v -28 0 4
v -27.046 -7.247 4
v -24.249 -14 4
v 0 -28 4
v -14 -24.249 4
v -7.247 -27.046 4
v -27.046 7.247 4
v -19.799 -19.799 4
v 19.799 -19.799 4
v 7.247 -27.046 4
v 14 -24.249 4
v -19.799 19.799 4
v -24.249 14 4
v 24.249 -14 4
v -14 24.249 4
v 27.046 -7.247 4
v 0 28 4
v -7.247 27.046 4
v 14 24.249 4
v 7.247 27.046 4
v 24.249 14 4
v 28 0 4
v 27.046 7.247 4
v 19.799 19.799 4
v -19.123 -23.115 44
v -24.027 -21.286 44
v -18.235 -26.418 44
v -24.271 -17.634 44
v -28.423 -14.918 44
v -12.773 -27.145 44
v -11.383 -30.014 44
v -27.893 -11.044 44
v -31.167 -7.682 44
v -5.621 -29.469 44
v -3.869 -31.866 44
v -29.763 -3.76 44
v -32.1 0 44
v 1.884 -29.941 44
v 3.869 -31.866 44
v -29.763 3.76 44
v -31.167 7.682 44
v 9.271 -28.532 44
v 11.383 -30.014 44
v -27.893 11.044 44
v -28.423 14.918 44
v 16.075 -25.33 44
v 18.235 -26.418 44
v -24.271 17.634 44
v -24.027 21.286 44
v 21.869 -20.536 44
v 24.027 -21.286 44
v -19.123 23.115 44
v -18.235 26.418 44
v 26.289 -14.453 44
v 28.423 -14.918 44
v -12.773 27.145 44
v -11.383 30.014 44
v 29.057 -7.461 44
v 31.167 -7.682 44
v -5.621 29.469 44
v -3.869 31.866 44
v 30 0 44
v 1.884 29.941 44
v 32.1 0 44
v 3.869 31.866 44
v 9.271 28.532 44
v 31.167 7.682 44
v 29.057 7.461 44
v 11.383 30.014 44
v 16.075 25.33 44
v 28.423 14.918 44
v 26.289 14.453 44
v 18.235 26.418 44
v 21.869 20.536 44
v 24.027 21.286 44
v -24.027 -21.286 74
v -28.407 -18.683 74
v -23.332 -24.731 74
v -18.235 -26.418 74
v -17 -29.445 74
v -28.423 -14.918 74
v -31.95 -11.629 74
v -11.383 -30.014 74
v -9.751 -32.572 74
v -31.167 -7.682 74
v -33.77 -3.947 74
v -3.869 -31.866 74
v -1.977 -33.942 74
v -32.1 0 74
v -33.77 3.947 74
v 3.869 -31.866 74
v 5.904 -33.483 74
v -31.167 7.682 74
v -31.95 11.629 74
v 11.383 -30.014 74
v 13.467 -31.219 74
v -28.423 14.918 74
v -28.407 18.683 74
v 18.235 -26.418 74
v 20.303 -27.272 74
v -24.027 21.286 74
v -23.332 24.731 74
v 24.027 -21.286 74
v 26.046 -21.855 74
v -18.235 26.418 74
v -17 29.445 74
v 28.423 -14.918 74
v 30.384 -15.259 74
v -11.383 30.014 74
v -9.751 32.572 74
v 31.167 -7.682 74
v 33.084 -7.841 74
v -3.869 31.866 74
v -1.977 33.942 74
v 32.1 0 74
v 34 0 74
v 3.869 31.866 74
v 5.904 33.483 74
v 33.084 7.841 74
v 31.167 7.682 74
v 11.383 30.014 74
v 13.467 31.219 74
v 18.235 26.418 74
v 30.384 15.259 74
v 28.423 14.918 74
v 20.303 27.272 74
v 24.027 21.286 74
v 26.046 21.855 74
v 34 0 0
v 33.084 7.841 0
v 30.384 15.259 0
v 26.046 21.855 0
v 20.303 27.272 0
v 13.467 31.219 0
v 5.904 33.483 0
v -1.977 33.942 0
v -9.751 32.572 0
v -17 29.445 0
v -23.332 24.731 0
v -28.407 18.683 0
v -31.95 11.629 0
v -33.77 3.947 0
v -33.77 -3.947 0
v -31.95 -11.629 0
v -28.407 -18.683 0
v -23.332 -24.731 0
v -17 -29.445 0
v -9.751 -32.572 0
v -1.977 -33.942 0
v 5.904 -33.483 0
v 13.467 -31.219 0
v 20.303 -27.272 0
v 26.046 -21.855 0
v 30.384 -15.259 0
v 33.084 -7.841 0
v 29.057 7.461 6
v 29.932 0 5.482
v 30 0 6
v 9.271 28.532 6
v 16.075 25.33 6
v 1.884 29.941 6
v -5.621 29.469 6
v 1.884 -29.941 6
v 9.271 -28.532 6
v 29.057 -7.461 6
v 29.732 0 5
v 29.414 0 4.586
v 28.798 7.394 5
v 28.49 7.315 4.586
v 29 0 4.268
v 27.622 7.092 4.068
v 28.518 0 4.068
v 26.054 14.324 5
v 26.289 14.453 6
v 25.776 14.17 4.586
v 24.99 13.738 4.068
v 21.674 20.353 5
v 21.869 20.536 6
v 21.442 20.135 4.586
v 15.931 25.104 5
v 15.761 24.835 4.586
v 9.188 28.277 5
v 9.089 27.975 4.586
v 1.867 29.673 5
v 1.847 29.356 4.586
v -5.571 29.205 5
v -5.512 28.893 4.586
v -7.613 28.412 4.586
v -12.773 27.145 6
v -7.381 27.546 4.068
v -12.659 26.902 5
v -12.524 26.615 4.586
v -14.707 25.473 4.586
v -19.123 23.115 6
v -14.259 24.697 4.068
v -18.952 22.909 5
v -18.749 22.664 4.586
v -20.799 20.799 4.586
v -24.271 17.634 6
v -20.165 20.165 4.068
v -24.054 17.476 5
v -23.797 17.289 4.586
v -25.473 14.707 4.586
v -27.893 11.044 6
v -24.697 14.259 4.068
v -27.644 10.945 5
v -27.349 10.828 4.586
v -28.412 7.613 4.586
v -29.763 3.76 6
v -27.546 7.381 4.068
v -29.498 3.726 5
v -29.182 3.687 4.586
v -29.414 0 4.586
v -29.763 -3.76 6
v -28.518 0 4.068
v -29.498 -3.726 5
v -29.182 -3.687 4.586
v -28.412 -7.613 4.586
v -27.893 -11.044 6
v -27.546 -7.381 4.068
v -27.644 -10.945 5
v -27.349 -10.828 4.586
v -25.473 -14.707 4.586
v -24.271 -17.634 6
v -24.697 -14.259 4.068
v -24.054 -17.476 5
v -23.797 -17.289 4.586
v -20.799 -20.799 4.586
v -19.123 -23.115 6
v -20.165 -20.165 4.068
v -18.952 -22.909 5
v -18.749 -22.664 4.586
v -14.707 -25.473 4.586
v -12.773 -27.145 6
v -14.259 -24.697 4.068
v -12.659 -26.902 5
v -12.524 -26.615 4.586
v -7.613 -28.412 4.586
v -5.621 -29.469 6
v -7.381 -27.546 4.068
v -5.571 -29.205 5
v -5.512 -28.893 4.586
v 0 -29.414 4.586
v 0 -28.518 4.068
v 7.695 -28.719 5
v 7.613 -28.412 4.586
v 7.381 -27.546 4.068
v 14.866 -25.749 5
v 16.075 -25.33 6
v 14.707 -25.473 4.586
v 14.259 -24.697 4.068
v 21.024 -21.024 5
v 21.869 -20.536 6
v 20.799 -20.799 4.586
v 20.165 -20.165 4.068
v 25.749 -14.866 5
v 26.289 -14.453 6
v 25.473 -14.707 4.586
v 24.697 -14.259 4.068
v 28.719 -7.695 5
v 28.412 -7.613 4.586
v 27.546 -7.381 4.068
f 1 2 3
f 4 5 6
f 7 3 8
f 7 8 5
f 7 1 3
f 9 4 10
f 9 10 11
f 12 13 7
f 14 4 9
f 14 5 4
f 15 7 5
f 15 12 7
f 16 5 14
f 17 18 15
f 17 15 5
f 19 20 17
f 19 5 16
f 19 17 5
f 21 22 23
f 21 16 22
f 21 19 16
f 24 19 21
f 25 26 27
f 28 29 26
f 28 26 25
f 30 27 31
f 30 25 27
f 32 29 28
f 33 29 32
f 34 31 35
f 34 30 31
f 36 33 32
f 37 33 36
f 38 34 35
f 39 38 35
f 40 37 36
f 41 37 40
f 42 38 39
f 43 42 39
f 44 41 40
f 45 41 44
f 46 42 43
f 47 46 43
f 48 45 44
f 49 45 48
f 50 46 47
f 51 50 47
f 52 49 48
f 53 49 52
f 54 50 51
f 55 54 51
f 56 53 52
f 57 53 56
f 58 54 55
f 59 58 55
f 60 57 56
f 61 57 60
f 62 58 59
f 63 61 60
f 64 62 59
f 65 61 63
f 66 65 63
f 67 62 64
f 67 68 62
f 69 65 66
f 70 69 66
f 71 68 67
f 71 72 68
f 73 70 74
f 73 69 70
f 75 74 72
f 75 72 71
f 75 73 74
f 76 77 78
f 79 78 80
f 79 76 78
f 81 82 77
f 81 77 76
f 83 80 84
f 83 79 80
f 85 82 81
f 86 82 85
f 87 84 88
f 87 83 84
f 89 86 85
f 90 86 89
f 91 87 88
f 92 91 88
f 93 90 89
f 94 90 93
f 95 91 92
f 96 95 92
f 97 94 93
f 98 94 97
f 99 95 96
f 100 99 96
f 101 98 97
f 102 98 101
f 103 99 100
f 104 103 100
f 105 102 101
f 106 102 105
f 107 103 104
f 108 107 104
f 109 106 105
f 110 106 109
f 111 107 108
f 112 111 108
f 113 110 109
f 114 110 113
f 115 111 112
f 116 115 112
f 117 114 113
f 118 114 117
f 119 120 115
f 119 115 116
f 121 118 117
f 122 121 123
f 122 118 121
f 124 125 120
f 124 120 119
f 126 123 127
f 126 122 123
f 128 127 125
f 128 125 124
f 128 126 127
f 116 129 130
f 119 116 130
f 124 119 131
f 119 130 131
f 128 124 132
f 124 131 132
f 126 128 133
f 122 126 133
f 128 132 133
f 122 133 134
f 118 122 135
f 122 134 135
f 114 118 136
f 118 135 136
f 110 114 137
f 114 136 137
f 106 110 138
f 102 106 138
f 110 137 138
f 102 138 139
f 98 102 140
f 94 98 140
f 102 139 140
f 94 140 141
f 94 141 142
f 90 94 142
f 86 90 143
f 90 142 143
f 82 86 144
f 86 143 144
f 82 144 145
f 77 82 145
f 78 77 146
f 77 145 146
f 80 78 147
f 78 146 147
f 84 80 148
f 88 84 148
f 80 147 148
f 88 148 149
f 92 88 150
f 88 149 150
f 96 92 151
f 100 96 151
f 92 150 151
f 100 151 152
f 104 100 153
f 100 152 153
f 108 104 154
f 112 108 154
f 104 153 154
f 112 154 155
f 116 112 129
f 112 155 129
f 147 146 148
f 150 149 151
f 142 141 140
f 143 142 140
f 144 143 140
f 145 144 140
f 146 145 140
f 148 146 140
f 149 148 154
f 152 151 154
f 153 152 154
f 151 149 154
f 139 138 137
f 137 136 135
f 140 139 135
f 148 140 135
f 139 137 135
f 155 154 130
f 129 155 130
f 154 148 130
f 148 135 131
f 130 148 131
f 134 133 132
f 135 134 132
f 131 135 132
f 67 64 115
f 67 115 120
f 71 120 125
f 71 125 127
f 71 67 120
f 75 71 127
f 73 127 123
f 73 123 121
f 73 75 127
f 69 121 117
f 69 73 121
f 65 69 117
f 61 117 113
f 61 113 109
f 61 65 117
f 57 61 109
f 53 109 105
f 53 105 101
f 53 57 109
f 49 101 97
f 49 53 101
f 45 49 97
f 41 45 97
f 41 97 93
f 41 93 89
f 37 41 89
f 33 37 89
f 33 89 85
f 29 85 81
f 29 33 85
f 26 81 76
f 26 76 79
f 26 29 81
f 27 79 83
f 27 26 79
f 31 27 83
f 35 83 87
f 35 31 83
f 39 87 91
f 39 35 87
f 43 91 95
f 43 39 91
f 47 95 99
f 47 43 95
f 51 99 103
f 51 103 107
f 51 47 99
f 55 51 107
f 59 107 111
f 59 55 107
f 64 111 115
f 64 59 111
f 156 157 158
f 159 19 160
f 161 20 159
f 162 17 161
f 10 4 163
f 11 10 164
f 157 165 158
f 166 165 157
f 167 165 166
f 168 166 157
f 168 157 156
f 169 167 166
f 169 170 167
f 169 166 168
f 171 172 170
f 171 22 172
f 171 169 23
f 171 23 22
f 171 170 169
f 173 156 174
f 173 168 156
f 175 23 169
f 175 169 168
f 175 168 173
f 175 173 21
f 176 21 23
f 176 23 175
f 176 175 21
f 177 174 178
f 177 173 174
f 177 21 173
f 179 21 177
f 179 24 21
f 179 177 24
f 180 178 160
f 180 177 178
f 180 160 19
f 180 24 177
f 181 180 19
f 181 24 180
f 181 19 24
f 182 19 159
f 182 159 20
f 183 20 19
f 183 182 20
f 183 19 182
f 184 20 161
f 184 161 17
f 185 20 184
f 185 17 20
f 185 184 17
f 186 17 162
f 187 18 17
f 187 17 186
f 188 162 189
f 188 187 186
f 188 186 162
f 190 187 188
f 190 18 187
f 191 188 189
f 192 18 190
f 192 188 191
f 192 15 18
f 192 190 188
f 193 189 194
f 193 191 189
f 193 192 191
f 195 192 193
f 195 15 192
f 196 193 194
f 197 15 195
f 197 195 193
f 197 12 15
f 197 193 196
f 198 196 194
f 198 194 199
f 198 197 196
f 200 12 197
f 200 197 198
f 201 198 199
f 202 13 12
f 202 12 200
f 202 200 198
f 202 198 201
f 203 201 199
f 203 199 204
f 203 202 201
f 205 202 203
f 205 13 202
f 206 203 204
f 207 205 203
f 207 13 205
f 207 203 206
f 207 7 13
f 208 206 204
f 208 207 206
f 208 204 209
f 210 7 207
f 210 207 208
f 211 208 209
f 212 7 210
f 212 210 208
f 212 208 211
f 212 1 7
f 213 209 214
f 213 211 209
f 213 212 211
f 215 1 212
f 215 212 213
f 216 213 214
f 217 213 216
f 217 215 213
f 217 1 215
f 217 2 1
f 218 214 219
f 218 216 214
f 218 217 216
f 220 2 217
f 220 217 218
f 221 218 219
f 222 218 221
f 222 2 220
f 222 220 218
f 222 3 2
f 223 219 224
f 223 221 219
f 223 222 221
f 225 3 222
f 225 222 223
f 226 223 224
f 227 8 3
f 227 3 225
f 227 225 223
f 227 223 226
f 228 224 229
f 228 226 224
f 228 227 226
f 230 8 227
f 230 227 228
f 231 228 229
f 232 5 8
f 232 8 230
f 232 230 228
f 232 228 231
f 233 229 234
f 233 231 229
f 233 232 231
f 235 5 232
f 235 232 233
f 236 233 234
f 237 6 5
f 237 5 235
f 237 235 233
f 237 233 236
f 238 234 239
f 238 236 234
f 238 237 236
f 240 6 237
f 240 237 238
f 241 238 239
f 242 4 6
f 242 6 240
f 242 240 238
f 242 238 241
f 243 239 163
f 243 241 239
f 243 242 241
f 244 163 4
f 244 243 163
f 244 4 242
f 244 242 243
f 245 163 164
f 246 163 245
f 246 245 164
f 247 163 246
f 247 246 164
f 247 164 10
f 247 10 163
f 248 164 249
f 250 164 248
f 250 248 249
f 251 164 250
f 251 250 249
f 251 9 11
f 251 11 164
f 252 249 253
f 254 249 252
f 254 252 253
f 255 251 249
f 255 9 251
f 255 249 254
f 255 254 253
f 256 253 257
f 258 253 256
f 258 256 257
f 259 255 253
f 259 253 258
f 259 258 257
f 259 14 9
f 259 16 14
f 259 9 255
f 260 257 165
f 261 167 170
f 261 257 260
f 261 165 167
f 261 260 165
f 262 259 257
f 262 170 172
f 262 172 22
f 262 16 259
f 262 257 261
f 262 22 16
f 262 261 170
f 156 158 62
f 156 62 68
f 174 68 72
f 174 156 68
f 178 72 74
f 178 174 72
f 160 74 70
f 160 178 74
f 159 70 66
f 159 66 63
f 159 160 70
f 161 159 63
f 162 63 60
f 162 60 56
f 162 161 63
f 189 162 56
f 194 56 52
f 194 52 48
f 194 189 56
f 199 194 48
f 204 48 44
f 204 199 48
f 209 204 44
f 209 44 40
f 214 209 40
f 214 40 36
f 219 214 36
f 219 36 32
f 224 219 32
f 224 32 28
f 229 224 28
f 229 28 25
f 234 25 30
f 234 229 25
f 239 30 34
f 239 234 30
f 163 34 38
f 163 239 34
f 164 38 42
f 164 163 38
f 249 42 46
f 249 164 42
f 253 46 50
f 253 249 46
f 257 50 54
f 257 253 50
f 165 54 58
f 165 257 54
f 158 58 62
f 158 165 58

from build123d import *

# Parameters (mm, degrees)
SKETCH1_R         = 34
BODY_DEPTH        = 74
SKETCH2_R         = 32.1
SLEEVE_BORE_DEPTH = 30
SKETCH3_R         = 30
CHAMBER_DEPTH     = 40
BASE_CORNER_R     = 2


with BuildPart() as part:
    # Sketch1 → Body (new body)
    with BuildSketch(Plane.XY):
        Circle(SKETCH1_R)
    extrude(amount=BODY_DEPTH)

    # Sketch2 → Sleeve_bore (cut)
    with BuildSketch(Plane.XY.offset(44)):
        Circle(SKETCH2_R)
    extrude(amount=SLEEVE_BORE_DEPTH, mode=Mode.SUBTRACT)

    # Sketch3 → Chamber (cut)
    with BuildSketch(Plane.XY.offset(4)):
        Circle(SKETCH3_R)
    extrude(amount=CHAMBER_DEPTH, mode=Mode.SUBTRACT)

    # Base_corner
    base_corner_edges = [part.edges().sort_by_distance(p)[0] for p in [
        (-30, 0, 4),
    ]]
    fillet(base_corner_edges, radius=BASE_CORNER_R)


solid = part.part
